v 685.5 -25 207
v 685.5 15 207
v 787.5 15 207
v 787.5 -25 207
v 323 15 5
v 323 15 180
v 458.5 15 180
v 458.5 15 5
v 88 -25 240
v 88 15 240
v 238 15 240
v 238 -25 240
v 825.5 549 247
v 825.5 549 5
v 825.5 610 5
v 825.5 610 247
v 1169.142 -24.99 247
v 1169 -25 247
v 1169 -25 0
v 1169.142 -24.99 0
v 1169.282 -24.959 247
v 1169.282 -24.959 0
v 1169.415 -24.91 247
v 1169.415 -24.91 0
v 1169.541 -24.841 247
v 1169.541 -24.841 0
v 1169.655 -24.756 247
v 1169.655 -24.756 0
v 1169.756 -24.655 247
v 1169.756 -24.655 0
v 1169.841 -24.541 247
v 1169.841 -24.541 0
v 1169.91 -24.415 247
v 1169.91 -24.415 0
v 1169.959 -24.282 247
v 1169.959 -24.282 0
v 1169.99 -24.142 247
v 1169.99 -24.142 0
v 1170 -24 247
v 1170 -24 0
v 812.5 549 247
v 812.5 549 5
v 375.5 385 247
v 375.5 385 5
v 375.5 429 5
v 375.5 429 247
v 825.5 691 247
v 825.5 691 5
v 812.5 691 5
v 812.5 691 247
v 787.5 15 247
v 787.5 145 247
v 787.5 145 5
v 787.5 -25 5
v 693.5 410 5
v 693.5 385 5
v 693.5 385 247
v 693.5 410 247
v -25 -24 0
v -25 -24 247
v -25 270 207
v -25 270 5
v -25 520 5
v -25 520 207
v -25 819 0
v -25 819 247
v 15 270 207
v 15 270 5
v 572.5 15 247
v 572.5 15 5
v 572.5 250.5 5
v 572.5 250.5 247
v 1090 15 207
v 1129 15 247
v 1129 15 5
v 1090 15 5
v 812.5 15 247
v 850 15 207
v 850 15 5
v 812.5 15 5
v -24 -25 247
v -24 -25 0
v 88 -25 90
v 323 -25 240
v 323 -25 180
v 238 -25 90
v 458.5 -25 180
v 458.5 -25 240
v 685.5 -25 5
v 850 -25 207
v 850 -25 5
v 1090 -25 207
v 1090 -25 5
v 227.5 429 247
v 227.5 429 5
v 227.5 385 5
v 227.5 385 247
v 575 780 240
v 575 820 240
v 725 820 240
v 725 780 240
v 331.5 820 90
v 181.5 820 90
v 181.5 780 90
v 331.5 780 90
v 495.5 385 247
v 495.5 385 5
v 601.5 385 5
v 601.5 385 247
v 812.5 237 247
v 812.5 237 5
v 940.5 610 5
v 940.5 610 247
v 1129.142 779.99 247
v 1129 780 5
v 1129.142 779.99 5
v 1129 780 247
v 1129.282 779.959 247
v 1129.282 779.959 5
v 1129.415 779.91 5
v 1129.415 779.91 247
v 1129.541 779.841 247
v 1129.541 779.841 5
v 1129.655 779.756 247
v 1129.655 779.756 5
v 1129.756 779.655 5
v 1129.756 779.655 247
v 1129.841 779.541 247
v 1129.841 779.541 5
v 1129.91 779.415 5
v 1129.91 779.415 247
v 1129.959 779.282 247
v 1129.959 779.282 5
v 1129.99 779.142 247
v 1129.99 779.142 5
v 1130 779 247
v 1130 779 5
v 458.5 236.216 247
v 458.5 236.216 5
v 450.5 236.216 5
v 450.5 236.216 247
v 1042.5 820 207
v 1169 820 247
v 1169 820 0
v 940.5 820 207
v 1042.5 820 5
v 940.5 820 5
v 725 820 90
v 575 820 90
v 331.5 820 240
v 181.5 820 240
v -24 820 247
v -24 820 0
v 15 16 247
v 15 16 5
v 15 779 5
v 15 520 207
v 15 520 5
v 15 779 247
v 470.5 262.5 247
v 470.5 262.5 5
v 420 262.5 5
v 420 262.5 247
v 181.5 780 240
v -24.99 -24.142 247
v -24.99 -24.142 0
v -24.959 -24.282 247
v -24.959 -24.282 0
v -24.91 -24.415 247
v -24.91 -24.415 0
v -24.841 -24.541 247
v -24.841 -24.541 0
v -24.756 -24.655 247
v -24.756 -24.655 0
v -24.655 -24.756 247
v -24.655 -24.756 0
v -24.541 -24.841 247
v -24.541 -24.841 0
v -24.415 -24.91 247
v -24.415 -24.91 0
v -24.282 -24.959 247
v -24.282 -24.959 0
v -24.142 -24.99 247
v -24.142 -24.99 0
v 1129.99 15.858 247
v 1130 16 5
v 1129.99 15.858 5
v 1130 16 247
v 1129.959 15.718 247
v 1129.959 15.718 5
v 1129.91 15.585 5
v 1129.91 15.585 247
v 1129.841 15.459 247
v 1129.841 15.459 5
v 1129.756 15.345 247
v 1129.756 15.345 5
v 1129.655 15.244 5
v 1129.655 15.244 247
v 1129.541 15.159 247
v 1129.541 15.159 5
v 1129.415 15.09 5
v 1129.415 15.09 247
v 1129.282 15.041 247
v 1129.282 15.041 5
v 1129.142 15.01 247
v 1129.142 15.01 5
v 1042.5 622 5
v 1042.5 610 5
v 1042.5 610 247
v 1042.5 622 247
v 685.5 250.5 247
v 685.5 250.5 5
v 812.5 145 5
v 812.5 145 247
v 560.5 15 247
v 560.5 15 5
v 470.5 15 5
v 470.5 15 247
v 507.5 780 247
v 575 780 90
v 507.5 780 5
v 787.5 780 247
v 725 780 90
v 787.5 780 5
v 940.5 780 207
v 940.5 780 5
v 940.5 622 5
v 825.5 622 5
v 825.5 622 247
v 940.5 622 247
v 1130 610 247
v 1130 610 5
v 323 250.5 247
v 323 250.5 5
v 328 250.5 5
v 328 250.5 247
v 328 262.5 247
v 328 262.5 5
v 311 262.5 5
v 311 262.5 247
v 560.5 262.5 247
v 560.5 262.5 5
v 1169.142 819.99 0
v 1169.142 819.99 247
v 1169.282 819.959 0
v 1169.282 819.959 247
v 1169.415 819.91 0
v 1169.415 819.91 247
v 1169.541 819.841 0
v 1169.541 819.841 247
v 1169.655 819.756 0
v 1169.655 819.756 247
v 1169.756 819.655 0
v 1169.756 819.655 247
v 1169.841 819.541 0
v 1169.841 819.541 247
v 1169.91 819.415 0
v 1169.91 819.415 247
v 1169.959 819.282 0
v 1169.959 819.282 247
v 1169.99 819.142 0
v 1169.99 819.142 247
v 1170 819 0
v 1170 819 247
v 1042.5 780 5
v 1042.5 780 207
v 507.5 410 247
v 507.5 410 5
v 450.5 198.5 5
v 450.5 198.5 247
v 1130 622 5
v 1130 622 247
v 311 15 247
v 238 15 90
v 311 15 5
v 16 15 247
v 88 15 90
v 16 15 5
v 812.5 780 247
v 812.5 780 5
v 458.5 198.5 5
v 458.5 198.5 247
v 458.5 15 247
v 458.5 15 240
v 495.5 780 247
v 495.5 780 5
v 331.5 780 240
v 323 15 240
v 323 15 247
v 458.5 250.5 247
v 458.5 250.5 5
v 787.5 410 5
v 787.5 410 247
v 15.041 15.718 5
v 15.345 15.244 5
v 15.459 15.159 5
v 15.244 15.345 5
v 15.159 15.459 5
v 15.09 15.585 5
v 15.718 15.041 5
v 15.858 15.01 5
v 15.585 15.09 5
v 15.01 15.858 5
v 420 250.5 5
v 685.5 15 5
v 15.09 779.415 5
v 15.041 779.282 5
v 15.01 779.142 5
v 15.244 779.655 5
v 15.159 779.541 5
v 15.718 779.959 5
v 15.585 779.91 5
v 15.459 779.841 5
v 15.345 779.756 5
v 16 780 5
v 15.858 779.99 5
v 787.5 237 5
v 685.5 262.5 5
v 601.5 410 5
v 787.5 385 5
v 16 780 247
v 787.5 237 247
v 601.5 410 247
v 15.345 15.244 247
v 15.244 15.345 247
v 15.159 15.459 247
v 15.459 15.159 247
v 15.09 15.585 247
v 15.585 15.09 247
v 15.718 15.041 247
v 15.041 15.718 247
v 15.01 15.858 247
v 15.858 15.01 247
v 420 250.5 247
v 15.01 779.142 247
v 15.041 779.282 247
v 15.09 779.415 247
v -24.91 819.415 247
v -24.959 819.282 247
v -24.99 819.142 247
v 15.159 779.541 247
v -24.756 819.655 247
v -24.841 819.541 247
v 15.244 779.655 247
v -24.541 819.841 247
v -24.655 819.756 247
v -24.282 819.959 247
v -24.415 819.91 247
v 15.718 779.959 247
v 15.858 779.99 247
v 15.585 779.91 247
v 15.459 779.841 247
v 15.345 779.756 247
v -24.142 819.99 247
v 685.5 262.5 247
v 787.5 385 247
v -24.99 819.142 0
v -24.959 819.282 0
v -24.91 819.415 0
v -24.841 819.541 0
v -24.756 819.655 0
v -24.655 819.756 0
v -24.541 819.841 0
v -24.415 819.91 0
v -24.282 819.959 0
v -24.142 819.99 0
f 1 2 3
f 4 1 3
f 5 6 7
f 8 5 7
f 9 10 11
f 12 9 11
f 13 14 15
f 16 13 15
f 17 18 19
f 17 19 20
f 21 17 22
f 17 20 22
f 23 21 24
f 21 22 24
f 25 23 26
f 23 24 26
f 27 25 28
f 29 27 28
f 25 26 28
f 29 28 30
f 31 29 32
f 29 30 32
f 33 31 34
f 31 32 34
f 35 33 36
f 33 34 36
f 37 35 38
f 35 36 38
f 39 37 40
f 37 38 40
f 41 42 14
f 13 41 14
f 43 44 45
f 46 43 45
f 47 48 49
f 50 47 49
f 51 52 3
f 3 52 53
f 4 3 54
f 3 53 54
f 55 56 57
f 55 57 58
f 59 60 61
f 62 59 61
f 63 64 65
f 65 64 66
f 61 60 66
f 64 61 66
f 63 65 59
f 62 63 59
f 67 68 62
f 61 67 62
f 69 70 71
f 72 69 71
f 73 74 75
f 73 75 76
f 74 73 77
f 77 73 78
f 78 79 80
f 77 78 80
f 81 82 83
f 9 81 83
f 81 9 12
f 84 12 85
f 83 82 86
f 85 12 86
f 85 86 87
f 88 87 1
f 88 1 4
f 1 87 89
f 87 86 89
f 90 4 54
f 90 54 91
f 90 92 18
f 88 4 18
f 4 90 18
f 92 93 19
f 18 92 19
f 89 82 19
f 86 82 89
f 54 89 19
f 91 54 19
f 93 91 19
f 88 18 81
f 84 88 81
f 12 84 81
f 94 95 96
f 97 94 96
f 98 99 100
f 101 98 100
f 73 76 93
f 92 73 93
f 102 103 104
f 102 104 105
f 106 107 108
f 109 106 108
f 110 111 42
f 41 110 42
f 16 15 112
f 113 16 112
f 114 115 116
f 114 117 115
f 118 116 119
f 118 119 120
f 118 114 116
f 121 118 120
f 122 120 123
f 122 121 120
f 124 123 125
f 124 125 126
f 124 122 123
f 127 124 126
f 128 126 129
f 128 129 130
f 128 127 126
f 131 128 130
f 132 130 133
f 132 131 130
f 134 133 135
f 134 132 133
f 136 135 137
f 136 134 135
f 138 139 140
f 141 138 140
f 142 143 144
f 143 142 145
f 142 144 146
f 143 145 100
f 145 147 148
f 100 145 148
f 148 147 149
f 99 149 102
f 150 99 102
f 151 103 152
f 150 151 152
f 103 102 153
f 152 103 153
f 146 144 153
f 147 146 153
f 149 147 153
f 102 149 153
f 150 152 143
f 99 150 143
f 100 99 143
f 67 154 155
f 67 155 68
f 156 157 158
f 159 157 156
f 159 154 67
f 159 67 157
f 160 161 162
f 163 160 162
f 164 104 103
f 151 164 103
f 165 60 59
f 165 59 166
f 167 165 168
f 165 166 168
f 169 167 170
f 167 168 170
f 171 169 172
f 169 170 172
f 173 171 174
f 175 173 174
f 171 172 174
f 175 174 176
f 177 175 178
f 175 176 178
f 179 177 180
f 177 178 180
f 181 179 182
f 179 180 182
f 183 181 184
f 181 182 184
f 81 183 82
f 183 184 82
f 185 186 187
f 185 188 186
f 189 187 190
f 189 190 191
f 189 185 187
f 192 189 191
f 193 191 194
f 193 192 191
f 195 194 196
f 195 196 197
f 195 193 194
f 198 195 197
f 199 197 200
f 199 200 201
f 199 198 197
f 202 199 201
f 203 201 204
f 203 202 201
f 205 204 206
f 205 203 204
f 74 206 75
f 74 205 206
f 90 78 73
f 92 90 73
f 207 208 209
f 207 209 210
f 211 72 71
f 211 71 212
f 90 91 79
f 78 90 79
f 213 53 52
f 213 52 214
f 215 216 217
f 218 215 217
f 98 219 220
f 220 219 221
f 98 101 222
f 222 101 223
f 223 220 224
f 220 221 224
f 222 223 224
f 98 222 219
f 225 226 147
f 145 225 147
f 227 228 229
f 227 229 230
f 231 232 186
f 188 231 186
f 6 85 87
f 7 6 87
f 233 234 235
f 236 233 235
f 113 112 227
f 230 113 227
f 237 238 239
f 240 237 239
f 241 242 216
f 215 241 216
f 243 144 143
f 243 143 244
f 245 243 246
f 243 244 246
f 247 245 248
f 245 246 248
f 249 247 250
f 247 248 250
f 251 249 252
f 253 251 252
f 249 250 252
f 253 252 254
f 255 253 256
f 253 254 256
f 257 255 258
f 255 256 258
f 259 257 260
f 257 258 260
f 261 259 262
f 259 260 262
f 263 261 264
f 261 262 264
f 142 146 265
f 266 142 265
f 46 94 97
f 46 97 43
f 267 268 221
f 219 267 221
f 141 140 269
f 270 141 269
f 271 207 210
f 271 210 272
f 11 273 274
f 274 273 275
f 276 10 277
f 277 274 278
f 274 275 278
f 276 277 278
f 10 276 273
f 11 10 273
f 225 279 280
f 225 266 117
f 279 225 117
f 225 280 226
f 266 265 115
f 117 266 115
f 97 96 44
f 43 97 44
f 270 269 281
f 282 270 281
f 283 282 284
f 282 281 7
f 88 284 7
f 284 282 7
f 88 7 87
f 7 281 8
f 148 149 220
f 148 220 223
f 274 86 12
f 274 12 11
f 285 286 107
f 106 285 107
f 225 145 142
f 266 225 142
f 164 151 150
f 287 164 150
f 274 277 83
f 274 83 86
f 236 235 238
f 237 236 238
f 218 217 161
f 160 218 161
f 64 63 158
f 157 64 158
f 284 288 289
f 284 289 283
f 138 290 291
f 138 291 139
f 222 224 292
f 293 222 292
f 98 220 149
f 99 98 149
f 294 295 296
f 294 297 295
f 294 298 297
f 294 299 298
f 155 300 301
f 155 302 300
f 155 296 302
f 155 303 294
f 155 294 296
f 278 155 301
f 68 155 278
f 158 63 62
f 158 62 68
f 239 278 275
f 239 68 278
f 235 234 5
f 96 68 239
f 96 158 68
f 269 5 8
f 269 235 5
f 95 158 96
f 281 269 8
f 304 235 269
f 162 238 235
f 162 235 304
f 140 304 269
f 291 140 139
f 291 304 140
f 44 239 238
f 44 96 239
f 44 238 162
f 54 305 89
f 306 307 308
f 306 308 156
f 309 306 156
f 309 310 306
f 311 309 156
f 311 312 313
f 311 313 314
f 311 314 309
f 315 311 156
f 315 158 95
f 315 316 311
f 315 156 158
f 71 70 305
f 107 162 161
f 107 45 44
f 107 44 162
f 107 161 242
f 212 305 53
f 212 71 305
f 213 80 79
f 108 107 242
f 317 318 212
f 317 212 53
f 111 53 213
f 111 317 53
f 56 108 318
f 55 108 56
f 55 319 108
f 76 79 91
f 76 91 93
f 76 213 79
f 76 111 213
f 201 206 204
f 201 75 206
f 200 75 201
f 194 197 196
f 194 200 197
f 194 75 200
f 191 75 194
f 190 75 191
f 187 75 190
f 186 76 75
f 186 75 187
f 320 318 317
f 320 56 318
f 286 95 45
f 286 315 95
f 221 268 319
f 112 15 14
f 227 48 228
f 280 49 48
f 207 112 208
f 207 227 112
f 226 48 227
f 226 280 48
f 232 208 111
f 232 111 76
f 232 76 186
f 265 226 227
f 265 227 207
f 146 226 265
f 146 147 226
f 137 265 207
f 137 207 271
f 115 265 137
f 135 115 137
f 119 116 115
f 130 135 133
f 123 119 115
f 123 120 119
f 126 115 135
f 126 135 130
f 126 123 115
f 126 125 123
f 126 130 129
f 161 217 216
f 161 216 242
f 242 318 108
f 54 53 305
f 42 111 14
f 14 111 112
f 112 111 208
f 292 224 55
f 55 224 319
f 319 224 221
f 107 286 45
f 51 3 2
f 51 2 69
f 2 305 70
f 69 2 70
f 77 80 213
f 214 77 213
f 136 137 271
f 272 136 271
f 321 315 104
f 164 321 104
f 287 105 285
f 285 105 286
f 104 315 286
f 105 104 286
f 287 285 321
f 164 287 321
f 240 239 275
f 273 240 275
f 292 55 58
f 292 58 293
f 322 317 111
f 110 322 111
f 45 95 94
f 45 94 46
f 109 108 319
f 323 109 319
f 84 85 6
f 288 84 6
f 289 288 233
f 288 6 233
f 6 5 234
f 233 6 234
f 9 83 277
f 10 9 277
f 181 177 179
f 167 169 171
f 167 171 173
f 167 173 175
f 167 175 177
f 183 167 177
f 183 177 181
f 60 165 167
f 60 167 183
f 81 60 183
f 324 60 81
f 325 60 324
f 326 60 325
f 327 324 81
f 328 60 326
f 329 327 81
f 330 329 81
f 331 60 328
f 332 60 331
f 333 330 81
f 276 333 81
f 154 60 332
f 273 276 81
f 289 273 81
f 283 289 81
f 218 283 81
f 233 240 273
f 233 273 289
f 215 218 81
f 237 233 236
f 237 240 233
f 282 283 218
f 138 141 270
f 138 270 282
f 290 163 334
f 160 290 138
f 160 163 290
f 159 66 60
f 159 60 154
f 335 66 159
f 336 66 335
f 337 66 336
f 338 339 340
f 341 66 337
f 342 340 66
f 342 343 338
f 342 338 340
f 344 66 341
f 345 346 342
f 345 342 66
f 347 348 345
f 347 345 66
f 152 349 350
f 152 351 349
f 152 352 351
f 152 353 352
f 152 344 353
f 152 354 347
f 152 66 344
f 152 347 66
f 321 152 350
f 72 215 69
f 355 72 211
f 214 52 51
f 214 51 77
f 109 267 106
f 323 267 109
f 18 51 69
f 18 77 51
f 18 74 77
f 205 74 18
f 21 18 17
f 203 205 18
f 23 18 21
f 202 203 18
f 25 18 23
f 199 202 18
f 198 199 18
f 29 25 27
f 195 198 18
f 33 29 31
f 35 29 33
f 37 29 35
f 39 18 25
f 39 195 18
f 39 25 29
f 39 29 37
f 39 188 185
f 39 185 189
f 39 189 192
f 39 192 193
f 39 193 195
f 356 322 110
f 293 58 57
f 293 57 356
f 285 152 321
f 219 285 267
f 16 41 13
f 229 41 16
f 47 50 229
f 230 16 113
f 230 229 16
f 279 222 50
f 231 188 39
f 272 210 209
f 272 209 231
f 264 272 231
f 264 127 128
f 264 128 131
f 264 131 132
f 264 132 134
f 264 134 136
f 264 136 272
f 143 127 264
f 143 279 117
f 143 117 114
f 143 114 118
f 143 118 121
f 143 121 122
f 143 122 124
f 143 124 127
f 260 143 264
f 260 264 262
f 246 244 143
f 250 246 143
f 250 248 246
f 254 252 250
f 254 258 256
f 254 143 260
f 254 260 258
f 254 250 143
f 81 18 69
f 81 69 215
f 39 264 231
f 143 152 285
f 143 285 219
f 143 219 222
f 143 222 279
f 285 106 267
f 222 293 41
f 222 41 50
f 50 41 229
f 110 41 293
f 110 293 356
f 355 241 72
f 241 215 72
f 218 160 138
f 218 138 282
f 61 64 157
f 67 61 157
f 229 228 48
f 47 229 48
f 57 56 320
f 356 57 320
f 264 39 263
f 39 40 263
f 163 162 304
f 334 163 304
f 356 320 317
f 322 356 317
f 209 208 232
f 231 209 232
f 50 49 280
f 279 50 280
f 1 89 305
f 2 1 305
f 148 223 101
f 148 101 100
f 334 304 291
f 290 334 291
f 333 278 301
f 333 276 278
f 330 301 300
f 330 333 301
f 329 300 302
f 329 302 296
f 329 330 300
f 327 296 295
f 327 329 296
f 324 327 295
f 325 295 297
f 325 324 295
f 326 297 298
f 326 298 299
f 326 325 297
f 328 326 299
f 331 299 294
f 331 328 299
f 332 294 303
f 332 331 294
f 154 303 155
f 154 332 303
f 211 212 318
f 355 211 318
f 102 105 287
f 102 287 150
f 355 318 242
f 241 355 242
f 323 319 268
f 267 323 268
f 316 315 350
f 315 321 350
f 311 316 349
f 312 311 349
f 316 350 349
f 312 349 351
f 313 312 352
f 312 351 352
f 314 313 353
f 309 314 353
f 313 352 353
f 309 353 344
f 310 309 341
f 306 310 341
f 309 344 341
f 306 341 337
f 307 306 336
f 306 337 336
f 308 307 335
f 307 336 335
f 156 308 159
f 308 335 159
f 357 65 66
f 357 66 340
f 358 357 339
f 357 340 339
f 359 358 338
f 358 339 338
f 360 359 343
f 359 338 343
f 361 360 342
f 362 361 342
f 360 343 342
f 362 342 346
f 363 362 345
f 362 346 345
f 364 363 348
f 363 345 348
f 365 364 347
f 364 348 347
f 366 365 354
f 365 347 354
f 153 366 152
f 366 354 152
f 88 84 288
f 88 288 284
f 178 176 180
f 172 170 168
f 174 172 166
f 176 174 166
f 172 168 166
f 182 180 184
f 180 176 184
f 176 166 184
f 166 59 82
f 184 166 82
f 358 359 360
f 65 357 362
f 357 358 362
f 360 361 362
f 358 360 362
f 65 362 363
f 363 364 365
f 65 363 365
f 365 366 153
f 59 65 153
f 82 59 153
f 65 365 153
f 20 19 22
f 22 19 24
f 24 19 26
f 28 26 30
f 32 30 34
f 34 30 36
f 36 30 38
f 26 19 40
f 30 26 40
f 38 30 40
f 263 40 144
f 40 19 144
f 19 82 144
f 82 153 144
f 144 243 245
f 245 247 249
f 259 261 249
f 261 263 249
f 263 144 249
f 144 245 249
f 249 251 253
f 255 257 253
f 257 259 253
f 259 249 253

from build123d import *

# Parameters (mm, degrees)
F0_W     = 102
F0_H     = 40
F0_W_2   = 240
F0_W_3   = 94
F0_H_2   = 25
F0_W_4   = 148
F0_W_5   = 92
F0_W_6   = 120
F0_H_3   = 19
F0_W_7   = 25
F0_H_4   = 92
F0_H_5   = 12
F0_W_8   = 12
F0_H_6   = 370
F0_W_9   = 87.5
F0_H_7   = 130
F0_W_10  = 212.5
F0_W_11  = 115
F0_W_12  = 150
F0_W_13  = 135.5
F1_DEPTH = 5
F2_DEPTH = 247
F3_W     = 40
F3_H     = 250
F3_W_2   = 102
F3_H_2   = 40
F3_W_3   = 240
F4_DEPTH = 40
F6_W     = 150
F6_H     = 40
F7_DEPTH = 150
F8_W     = 135.5
F8_H     = 40
F9_DEPTH = 60
F10_R    = 1


with BuildPart() as f1:
    # F0 (on Top) → F1 (new body)
    with BuildSketch(Plane.XY):
        Polygon((1170, -25), (1170, 820), (1042.5, 820), (1042.5, 780), (1130, 780), (1130, 622), (1130, 610), (1130, 15), (1090, 15), (1090, -25), align=None)
        with Locations((991.5, 800)):
            Rectangle(F0_W, F0_H)
        Polygon((940.5, 780), (940.5, 820), (725, 820), (725, 780), (787.5, 780), (812.5, 780), align=None)
        Polygon((15, 520), (-25, 520), (-25, 270), (15, 270), (15, 385), (15, 410), align=None)
        Polygon((458.5, -25), (685.5, -25), (685.5, 15), (572.5, 15), (560.5, 15), (470.5, 15), (458.5, 15), align=None)
        Polygon((685.5, -25), (787.5, -25), (787.5, 0), (787.5, 15), (685.5, 15), align=None)
        Polygon((787.5, -25), (850, -25), (850, 15), (812.5, 15), (787.5, 15), (787.5, 0), align=None)
        with Locations((970, -5)):
            Rectangle(F0_W_2, F0_H)
        Polygon((850, 15), (1090, 15), (1130, 15), (1130, 610), (1042.5, 610), (940.5, 610), (825.5, 610), (825.5, 549), (812.5, 549), (812.5, 237), (812.5, 145), (812.5, 15), align=None)
        with Locations((740.5, 397.5)):
            Rectangle(F0_W_3, F0_H_2)
        with Locations((301.5, 397.5)):
            Rectangle(F0_W_4, F0_H_2)
        with Locations((647.5, 397.5)):
            Rectangle(F0_W_5, F0_H_2)
        Polygon((601.5, 410), (507.5, 410), (495.5, 410), (495.5, 385), (601.5, 385), align=None)
        with Locations((435.5, 397.5)):
            Rectangle(F0_W_6, F0_H_2)
        Polygon((825.5, 691), (812.5, 691), (812.5, 549), (825.5, 549), (825.5, 610), (825.5, 622), align=None)
        with Locations((301.5, 419.5)):
            Rectangle(F0_W_4, F0_H_3)
        Polygon((495.5, 780), (331.5, 780), (181.5, 780), (15, 780), (15, 520), (15, 410), (227.5, 410), (227.5, 429), (375.5, 429), (375.5, 410), (495.5, 410), align=None)
        Polygon((1130, 780), (1042.5, 780), (940.5, 780), (812.5, 780), (812.5, 691), (825.5, 691), (825.5, 622), (940.5, 622), (1042.5, 622), (1130, 622), align=None)
        Polygon((311, 15), (323, 15), (323, 250.5), (328, 250.5), (328, 262.5), (311, 262.5), align=None)
        Polygon((572.5, 15), (685.5, 15), (787.5, 15), (787.5, 145), (787.5, 237), (787.5, 385), (693.5, 385), (601.5, 385), (495.5, 385), (375.5, 385), (227.5, 385), (15, 385), (15, 270), (15, 15), (88, 15), (238, 15), (311, 15), (311, 262.5), (328, 262.5), (328, 250.5), (323, 250.5), (323, 15), (458.5, 15), (458.5, 198.5), (450.5, 198.5), (450.5, 236.2157330513), (458.5, 236.2157330513), (458.5, 250.5), (420, 250.5), (420, 262.5), (470.5, 262.5), (470.5, 15), (560.5, 15), (560.5, 262.5), (685.5, 262.5), (685.5, 250.5), (572.5, 250.5), align=None)
        Polygon((812.5, 691), (812.5, 780), (787.5, 780), (787.5, 410), (787.5, 385), (787.5, 237), (812.5, 237), (812.5, 549), align=None)
        with Locations((800, 191)):
            Rectangle(F0_W_7, F0_H_4)
        with Locations((991.5, 616)):
            Rectangle(F0_W, F0_H_5)
        Polygon((560.5, 15), (572.5, 15), (572.5, 250.5), (685.5, 250.5), (685.5, 262.5), (560.5, 262.5), align=None)
        with Locations((501.5, 595)):
            Rectangle(F0_W_8, F0_H_6)
        with Locations((1086.25, 616)):
            Rectangle(F0_W_9, F0_H_5)
        with Locations((800, 80)):
            Rectangle(F0_W_7, F0_H_7)
        with Locations((121.25, 397.5)):
            Rectangle(F0_W_10, F0_H_2)
        Polygon((458.5, 198.5), (458.5, 15), (470.5, 15), (470.5, 262.5), (420, 262.5), (420, 250.5), (458.5, 250.5), (458.5, 236.2157330513), (450.5, 236.2157330513), (450.5, 198.5), align=None)
        with Locations((883, 616)):
            Rectangle(F0_W_11, F0_H_5)
        Polygon((787.5, 780), (725, 780), (575, 780), (507.5, 780), (507.5, 410), (601.5, 410), (693.5, 410), (787.5, 410), align=None)
        Polygon((181.5, 780), (181.5, 820), (-25, 820), (-25, 520), (15, 520), (15, 780), align=None)
        with Locations((256.5, 800)):
            Rectangle(F0_W_12, F0_H)
        Polygon((575, 780), (575, 820), (331.5, 820), (331.5, 780), (495.5, 780), (507.5, 780), align=None)
        with Locations((650, 800)):
            Rectangle(F0_W_12, F0_H)
        Polygon((15, 270), (-25, 270), (-25, -25), (88, -25), (88, 15), (15, 15), align=None)
        with Locations((163, -5)):
            Rectangle(F0_W_12, F0_H)
        Polygon((238, -25), (323, -25), (323, 15), (311, 15), (238, 15), align=None)
        with Locations((390.75, -5)):
            Rectangle(F0_W_13, F0_H)
    extrude(amount=F1_DEPTH)

    # F0 (on Top) → F2 (join)
    with BuildSketch(Plane.XY):
        Polygon((1170, -25), (1170, 820), (1042.5, 820), (1042.5, 780), (1130, 780), (1130, 622), (1130, 610), (1130, 15), (1090, 15), (1090, -25), align=None)
        Polygon((940.5, 780), (940.5, 820), (725, 820), (725, 780), (787.5, 780), (812.5, 780), align=None)
        Polygon((458.5, -25), (685.5, -25), (685.5, 15), (572.5, 15), (560.5, 15), (470.5, 15), (458.5, 15), align=None)
        Polygon((787.5, -25), (850, -25), (850, 15), (812.5, 15), (787.5, 15), (787.5, 0), align=None)
        with Locations((800, 80)):
            Rectangle(F0_W_7, F0_H_7)
        Polygon((812.5, 691), (812.5, 780), (787.5, 780), (787.5, 410), (787.5, 385), (787.5, 237), (812.5, 237), (812.5, 549), align=None)
        Polygon((825.5, 691), (812.5, 691), (812.5, 549), (825.5, 549), (825.5, 610), (825.5, 622), align=None)
        with Locations((883, 616)):
            Rectangle(F0_W_11, F0_H_5)
        with Locations((1086.25, 616)):
            Rectangle(F0_W_9, F0_H_5)
        with Locations((740.5, 397.5)):
            Rectangle(F0_W_3, F0_H_2)
        Polygon((601.5, 410), (507.5, 410), (495.5, 410), (495.5, 385), (601.5, 385), align=None)
        with Locations((501.5, 595)):
            Rectangle(F0_W_8, F0_H_6)
        with Locations((301.5, 419.5)):
            Rectangle(F0_W_4, F0_H_3)
        with Locations((301.5, 397.5)):
            Rectangle(F0_W_4, F0_H_2)
        Polygon((311, 15), (323, 15), (323, 250.5), (328, 250.5), (328, 262.5), (311, 262.5), align=None)
        Polygon((458.5, 198.5), (458.5, 15), (470.5, 15), (470.5, 262.5), (420, 262.5), (420, 250.5), (458.5, 250.5), (458.5, 236.2157330513), (450.5, 236.2157330513), (450.5, 198.5), align=None)
        Polygon((560.5, 15), (572.5, 15), (572.5, 250.5), (685.5, 250.5), (685.5, 262.5), (560.5, 262.5), align=None)
        Polygon((15, 270), (-25, 270), (-25, -25), (88, -25), (88, 15), (15, 15), align=None)
        Polygon((238, -25), (323, -25), (323, 15), (311, 15), (238, 15), align=None)
        with Locations((390.75, -5)):
            Rectangle(F0_W_13, F0_H)
        with Locations((163, -5)):
            Rectangle(F0_W_12, F0_H)
        Polygon((181.5, 780), (181.5, 820), (-25, 820), (-25, 520), (15, 520), (15, 780), align=None)
        with Locations((256.5, 800)):
            Rectangle(F0_W_12, F0_H)
        Polygon((575, 780), (575, 820), (331.5, 820), (331.5, 780), (495.5, 780), (507.5, 780), align=None)
        with Locations((650, 800)):
            Rectangle(F0_W_12, F0_H)
    extrude(amount=F2_DEPTH)

    # F3 (on face) → F4 (join)
    with BuildSketch(Plane.XY.offset(247)):
        with Locations((-5, 395)):
            Rectangle(F3_W, F3_H)
        with Locations((736.5, -5)):
            Rectangle(F3_W_2, F3_H_2)
        with Locations((970, -5)):
            Rectangle(F3_W_3, F3_H_2)
        with Locations((991.5, 800)):
            Rectangle(F3_W_2, F3_H_2)
    extrude(amount=-F4_DEPTH)

    # F6 (on offset) → F7 (cut)
    with BuildSketch(Plane.XY.offset(90)):
        with Locations((650, 800)):
            Rectangle(F6_W, F6_H)
        with Locations((256.5, 800)):
            Rectangle(F6_W, F6_H)
        with Locations((163, -5)):
            Rectangle(F6_W, F6_H)
    extrude(amount=F7_DEPTH, mode=Mode.SUBTRACT)

    # F8 (on face) → F9 (cut)
    with BuildSketch(Plane(origin=(0, 0, 240), x_dir=(1, 0, 0), z_dir=(0, 0, -1))):
        with Locations((390.75, 5)):
            Rectangle(F8_W, F8_H)
    extrude(amount=F9_DEPTH, mode=Mode.SUBTRACT)

    # F10
    f10_edges = [f1.edges().sort_by_distance(p)[0] for p in [
        (-25, -25, 123.5),
        (1170, -25, 123.5),
        (1170, 820, 123.5),
        (-25, 820, 123.5),
        (1130, 15, 126),
        (15, 15, 126),
        (15, 780, 126),
        (1130, 780, 126),
    ]]
    fillet(f10_edges, radius=F10_R)


solid = f1.part
